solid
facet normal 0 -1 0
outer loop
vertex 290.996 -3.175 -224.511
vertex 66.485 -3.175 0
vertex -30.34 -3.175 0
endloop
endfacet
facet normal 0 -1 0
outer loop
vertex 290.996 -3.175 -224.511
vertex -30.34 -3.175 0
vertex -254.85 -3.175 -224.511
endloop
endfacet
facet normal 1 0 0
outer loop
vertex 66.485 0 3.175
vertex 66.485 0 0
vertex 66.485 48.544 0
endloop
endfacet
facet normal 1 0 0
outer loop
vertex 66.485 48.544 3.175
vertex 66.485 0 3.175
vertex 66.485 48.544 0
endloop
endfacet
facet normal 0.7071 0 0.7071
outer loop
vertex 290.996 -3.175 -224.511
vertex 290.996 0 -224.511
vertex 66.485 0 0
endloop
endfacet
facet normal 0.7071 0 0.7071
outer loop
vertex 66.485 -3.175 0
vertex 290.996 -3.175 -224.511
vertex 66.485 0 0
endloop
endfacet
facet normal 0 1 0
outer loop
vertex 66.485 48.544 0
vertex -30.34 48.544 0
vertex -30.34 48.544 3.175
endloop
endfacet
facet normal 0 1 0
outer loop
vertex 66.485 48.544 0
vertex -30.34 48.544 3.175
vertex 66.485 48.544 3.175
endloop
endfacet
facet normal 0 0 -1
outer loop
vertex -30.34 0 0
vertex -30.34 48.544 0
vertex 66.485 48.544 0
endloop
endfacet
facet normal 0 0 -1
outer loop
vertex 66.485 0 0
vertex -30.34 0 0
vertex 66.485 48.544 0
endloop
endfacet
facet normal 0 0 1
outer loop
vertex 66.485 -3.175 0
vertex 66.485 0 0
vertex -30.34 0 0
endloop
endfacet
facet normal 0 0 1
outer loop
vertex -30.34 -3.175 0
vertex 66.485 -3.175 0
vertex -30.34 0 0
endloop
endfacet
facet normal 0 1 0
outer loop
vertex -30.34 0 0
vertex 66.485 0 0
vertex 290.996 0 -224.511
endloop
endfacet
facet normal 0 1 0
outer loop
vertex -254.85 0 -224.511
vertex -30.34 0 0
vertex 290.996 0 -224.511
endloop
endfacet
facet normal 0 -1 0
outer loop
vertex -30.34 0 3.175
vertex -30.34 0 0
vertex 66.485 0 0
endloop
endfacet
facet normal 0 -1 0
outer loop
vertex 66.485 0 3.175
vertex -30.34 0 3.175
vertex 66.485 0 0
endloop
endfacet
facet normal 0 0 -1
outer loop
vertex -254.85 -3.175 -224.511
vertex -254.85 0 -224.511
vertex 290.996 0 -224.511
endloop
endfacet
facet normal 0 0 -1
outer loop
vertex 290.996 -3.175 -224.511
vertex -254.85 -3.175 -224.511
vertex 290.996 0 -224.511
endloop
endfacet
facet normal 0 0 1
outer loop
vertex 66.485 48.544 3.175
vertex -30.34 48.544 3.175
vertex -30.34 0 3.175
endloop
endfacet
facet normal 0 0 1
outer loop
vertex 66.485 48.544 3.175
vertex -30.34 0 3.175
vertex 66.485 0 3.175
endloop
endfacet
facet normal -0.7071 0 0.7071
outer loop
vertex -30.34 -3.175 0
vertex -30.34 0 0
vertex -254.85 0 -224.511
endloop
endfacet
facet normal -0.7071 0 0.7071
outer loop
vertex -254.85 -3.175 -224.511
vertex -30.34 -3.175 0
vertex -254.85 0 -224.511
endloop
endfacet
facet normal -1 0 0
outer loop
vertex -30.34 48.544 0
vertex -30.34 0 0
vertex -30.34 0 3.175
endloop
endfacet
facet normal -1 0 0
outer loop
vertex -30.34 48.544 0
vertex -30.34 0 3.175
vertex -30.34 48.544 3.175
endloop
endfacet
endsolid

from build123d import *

# Parameters (mm, degrees)
F2_DEPTH = 3.175
F0_W     = 96.8248
F0_H     = 48.543591
F3_DEPTH = 3.175


with BuildPart() as f2:
    # F1 (on Front) → F2 (new body)
    with BuildSketch(Plane.XZ):
        Polygon((66.485056, 0), (-30.339744, 0), (-254.850344, -224.5106), (290.995656, -224.5106), align=None)
    extrude(amount=F2_DEPTH)


with BuildPart() as f3:
    # F0 (on Top) → F3 (new body)
    with BuildSketch(Plane.XY):
        with Locations((18.072656, 24.271795)):
            Rectangle(F0_W, F0_H)
    extrude(amount=F3_DEPTH)


solid = Compound([f2.part, f3.part])
